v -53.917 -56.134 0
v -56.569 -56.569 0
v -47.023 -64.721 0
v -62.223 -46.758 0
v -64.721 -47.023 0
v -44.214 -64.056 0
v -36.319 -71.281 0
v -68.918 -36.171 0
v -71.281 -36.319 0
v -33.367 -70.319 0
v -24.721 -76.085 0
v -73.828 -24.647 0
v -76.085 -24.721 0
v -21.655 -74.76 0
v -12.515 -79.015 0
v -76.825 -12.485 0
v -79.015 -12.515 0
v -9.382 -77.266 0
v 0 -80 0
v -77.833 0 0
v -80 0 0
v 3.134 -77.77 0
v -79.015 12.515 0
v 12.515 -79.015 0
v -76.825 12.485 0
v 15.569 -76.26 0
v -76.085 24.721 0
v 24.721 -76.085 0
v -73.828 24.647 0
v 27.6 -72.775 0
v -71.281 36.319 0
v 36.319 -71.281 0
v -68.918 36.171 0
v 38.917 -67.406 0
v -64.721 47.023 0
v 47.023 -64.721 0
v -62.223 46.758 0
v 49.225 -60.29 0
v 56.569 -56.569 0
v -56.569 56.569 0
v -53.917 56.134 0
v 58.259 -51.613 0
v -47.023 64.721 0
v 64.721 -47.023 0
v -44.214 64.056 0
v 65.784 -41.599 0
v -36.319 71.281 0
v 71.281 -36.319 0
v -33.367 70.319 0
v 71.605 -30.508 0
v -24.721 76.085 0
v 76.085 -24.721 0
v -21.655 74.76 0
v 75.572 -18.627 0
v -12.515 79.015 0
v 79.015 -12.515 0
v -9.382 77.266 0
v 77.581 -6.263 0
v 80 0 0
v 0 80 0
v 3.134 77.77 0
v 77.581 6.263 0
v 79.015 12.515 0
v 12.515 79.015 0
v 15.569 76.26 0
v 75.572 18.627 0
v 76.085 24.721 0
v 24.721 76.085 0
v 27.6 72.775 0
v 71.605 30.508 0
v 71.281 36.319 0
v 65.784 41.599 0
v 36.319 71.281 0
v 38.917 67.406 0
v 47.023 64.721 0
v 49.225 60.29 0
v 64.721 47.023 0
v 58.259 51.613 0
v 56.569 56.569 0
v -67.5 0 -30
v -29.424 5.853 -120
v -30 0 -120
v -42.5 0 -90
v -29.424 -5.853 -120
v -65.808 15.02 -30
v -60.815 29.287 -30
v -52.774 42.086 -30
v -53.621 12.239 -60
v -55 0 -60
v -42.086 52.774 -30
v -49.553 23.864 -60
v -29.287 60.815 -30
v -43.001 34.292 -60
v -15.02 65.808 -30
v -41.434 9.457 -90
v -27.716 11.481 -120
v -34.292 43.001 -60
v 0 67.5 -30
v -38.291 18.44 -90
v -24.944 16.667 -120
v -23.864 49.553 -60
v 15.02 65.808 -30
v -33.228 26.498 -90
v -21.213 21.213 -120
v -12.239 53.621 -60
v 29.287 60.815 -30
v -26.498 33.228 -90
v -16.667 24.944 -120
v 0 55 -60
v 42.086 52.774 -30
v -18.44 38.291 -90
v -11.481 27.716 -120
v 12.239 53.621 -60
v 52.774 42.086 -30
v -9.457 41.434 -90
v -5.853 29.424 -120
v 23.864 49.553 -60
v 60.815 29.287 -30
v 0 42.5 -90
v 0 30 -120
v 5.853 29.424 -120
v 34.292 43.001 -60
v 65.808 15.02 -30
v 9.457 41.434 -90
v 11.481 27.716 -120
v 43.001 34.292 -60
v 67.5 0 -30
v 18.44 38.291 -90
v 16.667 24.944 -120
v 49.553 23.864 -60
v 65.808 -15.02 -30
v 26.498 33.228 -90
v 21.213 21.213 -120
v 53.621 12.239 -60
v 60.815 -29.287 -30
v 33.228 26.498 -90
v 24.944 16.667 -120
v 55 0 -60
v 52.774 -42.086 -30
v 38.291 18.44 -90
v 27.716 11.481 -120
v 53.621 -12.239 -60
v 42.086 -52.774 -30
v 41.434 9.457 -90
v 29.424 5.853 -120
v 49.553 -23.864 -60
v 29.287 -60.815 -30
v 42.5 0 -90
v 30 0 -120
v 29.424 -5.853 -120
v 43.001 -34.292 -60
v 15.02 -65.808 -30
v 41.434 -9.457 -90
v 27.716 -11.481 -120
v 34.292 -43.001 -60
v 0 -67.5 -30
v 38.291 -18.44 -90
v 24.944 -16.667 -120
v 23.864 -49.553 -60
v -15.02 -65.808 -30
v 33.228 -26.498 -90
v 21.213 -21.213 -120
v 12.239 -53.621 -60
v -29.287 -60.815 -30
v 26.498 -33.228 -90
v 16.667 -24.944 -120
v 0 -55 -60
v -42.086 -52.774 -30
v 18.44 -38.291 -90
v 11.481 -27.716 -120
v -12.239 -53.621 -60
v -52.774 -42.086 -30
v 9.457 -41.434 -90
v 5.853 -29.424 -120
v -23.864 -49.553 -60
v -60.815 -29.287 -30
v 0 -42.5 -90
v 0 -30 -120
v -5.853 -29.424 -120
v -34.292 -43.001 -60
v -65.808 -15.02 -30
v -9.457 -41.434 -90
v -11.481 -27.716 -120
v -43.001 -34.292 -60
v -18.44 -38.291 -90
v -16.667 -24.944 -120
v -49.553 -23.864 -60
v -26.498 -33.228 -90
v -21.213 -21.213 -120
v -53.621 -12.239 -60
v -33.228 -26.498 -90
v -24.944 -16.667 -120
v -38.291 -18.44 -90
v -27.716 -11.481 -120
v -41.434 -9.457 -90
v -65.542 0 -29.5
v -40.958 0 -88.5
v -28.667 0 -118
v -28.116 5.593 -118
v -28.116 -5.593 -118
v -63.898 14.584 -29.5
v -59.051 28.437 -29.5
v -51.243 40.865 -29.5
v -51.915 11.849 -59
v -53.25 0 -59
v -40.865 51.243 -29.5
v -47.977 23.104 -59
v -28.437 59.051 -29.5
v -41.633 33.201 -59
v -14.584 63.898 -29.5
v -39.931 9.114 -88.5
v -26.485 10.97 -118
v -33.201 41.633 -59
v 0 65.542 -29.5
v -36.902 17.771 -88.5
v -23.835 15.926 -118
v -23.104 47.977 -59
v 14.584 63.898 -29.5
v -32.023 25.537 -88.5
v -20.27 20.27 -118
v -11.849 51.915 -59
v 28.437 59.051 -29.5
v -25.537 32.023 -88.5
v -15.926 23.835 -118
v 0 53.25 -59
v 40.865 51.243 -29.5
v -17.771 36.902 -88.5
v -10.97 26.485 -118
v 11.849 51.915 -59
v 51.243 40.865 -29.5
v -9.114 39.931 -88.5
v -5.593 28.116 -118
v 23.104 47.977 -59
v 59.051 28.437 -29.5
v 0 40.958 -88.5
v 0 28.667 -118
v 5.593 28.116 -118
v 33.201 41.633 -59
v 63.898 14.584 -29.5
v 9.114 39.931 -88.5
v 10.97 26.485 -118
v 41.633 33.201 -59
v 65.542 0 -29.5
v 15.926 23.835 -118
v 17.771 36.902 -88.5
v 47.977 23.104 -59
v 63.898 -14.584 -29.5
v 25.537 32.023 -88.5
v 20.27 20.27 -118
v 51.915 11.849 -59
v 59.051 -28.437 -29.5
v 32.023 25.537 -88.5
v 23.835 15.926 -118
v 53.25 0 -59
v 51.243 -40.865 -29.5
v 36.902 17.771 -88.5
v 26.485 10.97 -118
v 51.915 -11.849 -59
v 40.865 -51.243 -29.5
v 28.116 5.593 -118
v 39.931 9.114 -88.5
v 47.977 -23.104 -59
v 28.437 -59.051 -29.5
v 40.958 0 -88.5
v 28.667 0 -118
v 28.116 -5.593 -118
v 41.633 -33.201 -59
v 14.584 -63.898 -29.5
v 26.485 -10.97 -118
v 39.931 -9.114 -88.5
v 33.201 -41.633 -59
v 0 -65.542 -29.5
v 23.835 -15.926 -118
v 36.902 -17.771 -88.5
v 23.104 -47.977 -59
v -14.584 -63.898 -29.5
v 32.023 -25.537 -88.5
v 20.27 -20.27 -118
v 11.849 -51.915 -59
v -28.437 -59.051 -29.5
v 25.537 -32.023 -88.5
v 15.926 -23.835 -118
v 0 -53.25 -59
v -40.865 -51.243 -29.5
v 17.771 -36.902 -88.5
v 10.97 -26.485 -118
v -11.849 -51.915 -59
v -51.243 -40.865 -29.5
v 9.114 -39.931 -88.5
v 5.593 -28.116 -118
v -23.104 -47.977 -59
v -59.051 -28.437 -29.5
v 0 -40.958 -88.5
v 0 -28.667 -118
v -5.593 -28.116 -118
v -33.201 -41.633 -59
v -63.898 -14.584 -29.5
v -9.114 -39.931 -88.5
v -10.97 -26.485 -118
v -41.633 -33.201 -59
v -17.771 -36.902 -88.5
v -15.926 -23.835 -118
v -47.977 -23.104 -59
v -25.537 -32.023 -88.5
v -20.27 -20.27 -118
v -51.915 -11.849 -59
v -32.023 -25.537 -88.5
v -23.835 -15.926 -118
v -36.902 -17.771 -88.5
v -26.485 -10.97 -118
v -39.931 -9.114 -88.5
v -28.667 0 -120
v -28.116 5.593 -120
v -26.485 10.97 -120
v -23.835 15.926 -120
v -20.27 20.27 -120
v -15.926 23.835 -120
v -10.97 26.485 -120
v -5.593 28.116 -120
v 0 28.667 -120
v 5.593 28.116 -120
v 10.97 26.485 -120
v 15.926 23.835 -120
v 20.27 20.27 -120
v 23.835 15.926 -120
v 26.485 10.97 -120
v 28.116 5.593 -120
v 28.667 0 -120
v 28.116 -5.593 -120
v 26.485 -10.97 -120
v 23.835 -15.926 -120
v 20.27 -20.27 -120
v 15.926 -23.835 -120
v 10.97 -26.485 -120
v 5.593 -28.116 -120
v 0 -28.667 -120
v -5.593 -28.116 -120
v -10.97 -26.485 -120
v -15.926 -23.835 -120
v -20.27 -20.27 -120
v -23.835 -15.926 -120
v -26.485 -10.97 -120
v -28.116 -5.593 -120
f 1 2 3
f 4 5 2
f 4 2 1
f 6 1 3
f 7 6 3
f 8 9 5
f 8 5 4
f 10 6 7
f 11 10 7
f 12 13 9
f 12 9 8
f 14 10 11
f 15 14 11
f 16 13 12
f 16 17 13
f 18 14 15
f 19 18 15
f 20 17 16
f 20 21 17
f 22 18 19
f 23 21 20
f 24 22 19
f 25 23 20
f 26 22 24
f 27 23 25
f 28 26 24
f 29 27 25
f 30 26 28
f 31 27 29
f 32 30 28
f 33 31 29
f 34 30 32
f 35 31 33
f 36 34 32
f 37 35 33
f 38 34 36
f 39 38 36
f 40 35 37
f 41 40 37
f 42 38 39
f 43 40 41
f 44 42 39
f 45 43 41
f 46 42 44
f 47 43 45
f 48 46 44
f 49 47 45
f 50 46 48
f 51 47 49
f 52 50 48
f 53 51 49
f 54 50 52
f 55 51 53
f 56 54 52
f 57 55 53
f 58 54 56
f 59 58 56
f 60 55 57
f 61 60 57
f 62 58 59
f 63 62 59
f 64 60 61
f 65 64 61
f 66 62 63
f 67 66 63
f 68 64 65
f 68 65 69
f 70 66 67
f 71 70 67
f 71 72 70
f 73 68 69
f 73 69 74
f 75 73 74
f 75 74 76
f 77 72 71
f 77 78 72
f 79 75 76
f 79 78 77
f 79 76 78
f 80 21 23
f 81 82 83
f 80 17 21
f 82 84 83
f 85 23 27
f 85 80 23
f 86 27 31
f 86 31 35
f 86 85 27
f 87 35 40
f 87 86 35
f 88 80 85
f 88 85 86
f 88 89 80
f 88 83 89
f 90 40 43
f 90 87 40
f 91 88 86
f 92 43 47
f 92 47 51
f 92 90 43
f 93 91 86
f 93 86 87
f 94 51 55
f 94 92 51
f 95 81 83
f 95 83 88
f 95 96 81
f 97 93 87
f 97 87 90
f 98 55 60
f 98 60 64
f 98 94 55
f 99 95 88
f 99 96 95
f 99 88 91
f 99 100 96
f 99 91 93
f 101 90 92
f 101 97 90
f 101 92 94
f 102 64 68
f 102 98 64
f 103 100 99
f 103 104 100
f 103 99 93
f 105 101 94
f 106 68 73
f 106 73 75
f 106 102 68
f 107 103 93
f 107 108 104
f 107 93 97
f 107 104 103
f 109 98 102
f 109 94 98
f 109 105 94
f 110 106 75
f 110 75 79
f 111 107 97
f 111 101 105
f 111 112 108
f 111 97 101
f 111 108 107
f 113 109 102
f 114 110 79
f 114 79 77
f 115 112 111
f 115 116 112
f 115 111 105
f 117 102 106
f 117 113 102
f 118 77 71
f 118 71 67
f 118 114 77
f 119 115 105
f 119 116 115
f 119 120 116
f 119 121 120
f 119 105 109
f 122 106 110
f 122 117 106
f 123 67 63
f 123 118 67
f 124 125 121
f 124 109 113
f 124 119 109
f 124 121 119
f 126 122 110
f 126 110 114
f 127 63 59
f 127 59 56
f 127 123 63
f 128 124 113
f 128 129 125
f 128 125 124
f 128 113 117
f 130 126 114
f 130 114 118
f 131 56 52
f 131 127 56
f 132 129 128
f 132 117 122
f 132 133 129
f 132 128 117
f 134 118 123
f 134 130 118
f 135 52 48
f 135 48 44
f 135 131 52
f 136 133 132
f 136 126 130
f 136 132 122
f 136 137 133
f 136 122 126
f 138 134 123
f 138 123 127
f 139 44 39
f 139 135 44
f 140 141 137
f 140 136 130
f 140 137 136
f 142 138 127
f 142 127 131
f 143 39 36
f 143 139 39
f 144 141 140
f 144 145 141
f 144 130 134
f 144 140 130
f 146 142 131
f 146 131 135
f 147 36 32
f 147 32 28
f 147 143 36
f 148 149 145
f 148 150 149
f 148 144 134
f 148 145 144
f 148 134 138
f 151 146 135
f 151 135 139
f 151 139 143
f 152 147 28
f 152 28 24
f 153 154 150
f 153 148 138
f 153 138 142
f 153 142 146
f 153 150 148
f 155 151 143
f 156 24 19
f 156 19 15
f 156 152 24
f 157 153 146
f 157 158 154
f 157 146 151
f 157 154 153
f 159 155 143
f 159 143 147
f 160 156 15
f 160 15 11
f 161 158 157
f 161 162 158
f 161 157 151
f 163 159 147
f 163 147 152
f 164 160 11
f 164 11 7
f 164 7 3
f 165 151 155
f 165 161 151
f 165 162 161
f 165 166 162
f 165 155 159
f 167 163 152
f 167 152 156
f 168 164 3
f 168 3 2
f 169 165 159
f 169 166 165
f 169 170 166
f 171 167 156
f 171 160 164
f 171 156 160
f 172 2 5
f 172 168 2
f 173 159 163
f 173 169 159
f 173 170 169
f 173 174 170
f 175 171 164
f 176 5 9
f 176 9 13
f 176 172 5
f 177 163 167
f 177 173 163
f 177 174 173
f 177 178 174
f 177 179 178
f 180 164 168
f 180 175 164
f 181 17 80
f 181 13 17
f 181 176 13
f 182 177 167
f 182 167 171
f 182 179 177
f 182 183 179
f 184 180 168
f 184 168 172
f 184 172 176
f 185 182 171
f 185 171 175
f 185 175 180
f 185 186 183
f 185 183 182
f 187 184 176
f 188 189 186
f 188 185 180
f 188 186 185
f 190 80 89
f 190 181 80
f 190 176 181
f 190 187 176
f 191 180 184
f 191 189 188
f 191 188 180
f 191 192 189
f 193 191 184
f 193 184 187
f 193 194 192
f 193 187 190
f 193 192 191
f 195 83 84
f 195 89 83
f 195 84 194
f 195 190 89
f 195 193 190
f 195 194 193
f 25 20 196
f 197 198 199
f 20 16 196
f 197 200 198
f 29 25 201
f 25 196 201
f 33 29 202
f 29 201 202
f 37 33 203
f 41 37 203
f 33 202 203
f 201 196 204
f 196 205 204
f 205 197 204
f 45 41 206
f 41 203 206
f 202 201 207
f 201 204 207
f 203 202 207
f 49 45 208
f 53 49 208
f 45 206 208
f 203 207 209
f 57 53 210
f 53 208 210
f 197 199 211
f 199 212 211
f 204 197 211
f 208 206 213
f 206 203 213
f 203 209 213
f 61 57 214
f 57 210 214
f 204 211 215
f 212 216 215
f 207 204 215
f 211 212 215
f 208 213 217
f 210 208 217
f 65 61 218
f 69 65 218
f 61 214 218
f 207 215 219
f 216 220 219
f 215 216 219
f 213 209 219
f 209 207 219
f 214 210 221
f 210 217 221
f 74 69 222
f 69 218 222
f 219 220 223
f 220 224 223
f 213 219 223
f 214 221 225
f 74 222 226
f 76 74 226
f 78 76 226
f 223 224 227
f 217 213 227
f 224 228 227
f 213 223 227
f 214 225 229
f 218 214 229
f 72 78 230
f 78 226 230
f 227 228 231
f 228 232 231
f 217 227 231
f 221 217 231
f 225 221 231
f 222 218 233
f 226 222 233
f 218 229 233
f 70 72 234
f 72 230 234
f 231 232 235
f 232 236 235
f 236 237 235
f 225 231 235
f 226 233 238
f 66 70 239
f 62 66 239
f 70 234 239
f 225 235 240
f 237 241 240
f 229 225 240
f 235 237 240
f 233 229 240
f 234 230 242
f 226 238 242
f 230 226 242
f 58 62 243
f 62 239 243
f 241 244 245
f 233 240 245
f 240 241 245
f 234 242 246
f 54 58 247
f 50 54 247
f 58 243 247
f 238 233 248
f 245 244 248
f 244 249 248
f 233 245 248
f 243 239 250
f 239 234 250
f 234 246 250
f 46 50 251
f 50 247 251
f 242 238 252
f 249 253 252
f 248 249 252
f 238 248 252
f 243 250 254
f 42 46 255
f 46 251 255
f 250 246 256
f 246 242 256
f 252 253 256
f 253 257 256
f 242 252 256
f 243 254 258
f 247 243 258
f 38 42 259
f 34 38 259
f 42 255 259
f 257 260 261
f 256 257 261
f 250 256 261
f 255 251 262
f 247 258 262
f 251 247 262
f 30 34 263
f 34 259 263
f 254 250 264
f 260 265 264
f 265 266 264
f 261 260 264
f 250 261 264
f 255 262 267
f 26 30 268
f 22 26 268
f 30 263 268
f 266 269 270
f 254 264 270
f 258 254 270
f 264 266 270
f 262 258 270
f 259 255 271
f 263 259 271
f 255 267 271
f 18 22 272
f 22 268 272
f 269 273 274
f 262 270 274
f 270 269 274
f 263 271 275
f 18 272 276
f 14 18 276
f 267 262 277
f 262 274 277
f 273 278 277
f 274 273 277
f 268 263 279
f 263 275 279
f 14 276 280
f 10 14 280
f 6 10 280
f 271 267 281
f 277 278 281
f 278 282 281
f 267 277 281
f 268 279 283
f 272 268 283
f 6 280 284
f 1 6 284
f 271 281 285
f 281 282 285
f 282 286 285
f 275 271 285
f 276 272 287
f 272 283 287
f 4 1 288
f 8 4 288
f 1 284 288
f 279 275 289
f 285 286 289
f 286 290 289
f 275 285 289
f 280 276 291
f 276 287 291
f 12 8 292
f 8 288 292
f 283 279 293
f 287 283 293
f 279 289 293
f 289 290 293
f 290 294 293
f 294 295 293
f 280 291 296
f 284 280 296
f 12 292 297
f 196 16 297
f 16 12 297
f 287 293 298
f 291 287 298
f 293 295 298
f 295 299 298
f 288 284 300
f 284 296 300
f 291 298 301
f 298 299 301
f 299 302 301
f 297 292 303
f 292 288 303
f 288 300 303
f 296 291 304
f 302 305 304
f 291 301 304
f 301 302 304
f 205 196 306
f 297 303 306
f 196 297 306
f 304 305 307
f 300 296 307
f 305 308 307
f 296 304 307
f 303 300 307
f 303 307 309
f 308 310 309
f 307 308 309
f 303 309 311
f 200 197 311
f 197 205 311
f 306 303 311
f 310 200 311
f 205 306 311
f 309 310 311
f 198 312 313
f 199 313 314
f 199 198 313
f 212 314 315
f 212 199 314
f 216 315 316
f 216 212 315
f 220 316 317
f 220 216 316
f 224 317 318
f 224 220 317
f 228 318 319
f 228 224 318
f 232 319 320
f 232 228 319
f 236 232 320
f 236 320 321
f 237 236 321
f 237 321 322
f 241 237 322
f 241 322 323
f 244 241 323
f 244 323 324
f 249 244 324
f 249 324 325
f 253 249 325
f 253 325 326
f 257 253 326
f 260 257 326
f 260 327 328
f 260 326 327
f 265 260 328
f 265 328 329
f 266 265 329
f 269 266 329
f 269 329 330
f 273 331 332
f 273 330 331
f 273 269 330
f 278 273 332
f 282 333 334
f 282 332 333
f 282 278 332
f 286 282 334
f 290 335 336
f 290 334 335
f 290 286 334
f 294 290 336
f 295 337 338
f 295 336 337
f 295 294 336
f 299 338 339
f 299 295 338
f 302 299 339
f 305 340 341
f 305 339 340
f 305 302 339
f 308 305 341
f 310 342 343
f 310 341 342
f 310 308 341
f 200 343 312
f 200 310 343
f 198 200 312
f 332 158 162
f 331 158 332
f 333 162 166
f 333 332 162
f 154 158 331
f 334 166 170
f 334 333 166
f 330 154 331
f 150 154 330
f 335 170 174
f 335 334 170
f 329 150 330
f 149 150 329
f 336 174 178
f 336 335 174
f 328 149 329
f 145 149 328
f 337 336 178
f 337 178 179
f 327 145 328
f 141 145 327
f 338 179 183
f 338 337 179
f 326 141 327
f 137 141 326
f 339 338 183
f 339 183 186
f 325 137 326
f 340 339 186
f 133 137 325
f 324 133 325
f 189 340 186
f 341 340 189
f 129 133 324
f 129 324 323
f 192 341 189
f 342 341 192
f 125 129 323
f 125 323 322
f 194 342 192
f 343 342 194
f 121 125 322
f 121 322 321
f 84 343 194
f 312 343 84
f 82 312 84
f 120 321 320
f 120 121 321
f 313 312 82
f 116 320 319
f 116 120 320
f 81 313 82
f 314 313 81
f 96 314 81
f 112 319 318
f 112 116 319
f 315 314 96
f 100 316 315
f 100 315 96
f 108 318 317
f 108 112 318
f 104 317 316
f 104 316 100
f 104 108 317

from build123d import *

# Parameters (mm, degrees)
F2_T     = -2
F3_DEPTH = 25


with BuildPart() as f1:
    # F0 (on Front) → F1 (revolve)
    with BuildSketch(Plane.XZ):
        Polygon((0, -120), (0, 0), (-80, 0), (-30, -120), align=None)
    revolve(axis=Axis((0, 0, -60), (0, 0, -1)))

    # F2
    f2_openings = [f1.faces().sort_by_distance(p)[0] for p in [
        (0, 0, 0),
    ]]
    offset(amount=F2_T, openings=f2_openings)

    # F3 (cut): a face of the model
    f3_faces = [f1.faces().sort_by_distance(p)[0] for p in [
        (0, 0, -118),
    ]]
    extrude(f3_faces, amount=-F3_DEPTH, mode=Mode.SUBTRACT)


solid = f1.part
